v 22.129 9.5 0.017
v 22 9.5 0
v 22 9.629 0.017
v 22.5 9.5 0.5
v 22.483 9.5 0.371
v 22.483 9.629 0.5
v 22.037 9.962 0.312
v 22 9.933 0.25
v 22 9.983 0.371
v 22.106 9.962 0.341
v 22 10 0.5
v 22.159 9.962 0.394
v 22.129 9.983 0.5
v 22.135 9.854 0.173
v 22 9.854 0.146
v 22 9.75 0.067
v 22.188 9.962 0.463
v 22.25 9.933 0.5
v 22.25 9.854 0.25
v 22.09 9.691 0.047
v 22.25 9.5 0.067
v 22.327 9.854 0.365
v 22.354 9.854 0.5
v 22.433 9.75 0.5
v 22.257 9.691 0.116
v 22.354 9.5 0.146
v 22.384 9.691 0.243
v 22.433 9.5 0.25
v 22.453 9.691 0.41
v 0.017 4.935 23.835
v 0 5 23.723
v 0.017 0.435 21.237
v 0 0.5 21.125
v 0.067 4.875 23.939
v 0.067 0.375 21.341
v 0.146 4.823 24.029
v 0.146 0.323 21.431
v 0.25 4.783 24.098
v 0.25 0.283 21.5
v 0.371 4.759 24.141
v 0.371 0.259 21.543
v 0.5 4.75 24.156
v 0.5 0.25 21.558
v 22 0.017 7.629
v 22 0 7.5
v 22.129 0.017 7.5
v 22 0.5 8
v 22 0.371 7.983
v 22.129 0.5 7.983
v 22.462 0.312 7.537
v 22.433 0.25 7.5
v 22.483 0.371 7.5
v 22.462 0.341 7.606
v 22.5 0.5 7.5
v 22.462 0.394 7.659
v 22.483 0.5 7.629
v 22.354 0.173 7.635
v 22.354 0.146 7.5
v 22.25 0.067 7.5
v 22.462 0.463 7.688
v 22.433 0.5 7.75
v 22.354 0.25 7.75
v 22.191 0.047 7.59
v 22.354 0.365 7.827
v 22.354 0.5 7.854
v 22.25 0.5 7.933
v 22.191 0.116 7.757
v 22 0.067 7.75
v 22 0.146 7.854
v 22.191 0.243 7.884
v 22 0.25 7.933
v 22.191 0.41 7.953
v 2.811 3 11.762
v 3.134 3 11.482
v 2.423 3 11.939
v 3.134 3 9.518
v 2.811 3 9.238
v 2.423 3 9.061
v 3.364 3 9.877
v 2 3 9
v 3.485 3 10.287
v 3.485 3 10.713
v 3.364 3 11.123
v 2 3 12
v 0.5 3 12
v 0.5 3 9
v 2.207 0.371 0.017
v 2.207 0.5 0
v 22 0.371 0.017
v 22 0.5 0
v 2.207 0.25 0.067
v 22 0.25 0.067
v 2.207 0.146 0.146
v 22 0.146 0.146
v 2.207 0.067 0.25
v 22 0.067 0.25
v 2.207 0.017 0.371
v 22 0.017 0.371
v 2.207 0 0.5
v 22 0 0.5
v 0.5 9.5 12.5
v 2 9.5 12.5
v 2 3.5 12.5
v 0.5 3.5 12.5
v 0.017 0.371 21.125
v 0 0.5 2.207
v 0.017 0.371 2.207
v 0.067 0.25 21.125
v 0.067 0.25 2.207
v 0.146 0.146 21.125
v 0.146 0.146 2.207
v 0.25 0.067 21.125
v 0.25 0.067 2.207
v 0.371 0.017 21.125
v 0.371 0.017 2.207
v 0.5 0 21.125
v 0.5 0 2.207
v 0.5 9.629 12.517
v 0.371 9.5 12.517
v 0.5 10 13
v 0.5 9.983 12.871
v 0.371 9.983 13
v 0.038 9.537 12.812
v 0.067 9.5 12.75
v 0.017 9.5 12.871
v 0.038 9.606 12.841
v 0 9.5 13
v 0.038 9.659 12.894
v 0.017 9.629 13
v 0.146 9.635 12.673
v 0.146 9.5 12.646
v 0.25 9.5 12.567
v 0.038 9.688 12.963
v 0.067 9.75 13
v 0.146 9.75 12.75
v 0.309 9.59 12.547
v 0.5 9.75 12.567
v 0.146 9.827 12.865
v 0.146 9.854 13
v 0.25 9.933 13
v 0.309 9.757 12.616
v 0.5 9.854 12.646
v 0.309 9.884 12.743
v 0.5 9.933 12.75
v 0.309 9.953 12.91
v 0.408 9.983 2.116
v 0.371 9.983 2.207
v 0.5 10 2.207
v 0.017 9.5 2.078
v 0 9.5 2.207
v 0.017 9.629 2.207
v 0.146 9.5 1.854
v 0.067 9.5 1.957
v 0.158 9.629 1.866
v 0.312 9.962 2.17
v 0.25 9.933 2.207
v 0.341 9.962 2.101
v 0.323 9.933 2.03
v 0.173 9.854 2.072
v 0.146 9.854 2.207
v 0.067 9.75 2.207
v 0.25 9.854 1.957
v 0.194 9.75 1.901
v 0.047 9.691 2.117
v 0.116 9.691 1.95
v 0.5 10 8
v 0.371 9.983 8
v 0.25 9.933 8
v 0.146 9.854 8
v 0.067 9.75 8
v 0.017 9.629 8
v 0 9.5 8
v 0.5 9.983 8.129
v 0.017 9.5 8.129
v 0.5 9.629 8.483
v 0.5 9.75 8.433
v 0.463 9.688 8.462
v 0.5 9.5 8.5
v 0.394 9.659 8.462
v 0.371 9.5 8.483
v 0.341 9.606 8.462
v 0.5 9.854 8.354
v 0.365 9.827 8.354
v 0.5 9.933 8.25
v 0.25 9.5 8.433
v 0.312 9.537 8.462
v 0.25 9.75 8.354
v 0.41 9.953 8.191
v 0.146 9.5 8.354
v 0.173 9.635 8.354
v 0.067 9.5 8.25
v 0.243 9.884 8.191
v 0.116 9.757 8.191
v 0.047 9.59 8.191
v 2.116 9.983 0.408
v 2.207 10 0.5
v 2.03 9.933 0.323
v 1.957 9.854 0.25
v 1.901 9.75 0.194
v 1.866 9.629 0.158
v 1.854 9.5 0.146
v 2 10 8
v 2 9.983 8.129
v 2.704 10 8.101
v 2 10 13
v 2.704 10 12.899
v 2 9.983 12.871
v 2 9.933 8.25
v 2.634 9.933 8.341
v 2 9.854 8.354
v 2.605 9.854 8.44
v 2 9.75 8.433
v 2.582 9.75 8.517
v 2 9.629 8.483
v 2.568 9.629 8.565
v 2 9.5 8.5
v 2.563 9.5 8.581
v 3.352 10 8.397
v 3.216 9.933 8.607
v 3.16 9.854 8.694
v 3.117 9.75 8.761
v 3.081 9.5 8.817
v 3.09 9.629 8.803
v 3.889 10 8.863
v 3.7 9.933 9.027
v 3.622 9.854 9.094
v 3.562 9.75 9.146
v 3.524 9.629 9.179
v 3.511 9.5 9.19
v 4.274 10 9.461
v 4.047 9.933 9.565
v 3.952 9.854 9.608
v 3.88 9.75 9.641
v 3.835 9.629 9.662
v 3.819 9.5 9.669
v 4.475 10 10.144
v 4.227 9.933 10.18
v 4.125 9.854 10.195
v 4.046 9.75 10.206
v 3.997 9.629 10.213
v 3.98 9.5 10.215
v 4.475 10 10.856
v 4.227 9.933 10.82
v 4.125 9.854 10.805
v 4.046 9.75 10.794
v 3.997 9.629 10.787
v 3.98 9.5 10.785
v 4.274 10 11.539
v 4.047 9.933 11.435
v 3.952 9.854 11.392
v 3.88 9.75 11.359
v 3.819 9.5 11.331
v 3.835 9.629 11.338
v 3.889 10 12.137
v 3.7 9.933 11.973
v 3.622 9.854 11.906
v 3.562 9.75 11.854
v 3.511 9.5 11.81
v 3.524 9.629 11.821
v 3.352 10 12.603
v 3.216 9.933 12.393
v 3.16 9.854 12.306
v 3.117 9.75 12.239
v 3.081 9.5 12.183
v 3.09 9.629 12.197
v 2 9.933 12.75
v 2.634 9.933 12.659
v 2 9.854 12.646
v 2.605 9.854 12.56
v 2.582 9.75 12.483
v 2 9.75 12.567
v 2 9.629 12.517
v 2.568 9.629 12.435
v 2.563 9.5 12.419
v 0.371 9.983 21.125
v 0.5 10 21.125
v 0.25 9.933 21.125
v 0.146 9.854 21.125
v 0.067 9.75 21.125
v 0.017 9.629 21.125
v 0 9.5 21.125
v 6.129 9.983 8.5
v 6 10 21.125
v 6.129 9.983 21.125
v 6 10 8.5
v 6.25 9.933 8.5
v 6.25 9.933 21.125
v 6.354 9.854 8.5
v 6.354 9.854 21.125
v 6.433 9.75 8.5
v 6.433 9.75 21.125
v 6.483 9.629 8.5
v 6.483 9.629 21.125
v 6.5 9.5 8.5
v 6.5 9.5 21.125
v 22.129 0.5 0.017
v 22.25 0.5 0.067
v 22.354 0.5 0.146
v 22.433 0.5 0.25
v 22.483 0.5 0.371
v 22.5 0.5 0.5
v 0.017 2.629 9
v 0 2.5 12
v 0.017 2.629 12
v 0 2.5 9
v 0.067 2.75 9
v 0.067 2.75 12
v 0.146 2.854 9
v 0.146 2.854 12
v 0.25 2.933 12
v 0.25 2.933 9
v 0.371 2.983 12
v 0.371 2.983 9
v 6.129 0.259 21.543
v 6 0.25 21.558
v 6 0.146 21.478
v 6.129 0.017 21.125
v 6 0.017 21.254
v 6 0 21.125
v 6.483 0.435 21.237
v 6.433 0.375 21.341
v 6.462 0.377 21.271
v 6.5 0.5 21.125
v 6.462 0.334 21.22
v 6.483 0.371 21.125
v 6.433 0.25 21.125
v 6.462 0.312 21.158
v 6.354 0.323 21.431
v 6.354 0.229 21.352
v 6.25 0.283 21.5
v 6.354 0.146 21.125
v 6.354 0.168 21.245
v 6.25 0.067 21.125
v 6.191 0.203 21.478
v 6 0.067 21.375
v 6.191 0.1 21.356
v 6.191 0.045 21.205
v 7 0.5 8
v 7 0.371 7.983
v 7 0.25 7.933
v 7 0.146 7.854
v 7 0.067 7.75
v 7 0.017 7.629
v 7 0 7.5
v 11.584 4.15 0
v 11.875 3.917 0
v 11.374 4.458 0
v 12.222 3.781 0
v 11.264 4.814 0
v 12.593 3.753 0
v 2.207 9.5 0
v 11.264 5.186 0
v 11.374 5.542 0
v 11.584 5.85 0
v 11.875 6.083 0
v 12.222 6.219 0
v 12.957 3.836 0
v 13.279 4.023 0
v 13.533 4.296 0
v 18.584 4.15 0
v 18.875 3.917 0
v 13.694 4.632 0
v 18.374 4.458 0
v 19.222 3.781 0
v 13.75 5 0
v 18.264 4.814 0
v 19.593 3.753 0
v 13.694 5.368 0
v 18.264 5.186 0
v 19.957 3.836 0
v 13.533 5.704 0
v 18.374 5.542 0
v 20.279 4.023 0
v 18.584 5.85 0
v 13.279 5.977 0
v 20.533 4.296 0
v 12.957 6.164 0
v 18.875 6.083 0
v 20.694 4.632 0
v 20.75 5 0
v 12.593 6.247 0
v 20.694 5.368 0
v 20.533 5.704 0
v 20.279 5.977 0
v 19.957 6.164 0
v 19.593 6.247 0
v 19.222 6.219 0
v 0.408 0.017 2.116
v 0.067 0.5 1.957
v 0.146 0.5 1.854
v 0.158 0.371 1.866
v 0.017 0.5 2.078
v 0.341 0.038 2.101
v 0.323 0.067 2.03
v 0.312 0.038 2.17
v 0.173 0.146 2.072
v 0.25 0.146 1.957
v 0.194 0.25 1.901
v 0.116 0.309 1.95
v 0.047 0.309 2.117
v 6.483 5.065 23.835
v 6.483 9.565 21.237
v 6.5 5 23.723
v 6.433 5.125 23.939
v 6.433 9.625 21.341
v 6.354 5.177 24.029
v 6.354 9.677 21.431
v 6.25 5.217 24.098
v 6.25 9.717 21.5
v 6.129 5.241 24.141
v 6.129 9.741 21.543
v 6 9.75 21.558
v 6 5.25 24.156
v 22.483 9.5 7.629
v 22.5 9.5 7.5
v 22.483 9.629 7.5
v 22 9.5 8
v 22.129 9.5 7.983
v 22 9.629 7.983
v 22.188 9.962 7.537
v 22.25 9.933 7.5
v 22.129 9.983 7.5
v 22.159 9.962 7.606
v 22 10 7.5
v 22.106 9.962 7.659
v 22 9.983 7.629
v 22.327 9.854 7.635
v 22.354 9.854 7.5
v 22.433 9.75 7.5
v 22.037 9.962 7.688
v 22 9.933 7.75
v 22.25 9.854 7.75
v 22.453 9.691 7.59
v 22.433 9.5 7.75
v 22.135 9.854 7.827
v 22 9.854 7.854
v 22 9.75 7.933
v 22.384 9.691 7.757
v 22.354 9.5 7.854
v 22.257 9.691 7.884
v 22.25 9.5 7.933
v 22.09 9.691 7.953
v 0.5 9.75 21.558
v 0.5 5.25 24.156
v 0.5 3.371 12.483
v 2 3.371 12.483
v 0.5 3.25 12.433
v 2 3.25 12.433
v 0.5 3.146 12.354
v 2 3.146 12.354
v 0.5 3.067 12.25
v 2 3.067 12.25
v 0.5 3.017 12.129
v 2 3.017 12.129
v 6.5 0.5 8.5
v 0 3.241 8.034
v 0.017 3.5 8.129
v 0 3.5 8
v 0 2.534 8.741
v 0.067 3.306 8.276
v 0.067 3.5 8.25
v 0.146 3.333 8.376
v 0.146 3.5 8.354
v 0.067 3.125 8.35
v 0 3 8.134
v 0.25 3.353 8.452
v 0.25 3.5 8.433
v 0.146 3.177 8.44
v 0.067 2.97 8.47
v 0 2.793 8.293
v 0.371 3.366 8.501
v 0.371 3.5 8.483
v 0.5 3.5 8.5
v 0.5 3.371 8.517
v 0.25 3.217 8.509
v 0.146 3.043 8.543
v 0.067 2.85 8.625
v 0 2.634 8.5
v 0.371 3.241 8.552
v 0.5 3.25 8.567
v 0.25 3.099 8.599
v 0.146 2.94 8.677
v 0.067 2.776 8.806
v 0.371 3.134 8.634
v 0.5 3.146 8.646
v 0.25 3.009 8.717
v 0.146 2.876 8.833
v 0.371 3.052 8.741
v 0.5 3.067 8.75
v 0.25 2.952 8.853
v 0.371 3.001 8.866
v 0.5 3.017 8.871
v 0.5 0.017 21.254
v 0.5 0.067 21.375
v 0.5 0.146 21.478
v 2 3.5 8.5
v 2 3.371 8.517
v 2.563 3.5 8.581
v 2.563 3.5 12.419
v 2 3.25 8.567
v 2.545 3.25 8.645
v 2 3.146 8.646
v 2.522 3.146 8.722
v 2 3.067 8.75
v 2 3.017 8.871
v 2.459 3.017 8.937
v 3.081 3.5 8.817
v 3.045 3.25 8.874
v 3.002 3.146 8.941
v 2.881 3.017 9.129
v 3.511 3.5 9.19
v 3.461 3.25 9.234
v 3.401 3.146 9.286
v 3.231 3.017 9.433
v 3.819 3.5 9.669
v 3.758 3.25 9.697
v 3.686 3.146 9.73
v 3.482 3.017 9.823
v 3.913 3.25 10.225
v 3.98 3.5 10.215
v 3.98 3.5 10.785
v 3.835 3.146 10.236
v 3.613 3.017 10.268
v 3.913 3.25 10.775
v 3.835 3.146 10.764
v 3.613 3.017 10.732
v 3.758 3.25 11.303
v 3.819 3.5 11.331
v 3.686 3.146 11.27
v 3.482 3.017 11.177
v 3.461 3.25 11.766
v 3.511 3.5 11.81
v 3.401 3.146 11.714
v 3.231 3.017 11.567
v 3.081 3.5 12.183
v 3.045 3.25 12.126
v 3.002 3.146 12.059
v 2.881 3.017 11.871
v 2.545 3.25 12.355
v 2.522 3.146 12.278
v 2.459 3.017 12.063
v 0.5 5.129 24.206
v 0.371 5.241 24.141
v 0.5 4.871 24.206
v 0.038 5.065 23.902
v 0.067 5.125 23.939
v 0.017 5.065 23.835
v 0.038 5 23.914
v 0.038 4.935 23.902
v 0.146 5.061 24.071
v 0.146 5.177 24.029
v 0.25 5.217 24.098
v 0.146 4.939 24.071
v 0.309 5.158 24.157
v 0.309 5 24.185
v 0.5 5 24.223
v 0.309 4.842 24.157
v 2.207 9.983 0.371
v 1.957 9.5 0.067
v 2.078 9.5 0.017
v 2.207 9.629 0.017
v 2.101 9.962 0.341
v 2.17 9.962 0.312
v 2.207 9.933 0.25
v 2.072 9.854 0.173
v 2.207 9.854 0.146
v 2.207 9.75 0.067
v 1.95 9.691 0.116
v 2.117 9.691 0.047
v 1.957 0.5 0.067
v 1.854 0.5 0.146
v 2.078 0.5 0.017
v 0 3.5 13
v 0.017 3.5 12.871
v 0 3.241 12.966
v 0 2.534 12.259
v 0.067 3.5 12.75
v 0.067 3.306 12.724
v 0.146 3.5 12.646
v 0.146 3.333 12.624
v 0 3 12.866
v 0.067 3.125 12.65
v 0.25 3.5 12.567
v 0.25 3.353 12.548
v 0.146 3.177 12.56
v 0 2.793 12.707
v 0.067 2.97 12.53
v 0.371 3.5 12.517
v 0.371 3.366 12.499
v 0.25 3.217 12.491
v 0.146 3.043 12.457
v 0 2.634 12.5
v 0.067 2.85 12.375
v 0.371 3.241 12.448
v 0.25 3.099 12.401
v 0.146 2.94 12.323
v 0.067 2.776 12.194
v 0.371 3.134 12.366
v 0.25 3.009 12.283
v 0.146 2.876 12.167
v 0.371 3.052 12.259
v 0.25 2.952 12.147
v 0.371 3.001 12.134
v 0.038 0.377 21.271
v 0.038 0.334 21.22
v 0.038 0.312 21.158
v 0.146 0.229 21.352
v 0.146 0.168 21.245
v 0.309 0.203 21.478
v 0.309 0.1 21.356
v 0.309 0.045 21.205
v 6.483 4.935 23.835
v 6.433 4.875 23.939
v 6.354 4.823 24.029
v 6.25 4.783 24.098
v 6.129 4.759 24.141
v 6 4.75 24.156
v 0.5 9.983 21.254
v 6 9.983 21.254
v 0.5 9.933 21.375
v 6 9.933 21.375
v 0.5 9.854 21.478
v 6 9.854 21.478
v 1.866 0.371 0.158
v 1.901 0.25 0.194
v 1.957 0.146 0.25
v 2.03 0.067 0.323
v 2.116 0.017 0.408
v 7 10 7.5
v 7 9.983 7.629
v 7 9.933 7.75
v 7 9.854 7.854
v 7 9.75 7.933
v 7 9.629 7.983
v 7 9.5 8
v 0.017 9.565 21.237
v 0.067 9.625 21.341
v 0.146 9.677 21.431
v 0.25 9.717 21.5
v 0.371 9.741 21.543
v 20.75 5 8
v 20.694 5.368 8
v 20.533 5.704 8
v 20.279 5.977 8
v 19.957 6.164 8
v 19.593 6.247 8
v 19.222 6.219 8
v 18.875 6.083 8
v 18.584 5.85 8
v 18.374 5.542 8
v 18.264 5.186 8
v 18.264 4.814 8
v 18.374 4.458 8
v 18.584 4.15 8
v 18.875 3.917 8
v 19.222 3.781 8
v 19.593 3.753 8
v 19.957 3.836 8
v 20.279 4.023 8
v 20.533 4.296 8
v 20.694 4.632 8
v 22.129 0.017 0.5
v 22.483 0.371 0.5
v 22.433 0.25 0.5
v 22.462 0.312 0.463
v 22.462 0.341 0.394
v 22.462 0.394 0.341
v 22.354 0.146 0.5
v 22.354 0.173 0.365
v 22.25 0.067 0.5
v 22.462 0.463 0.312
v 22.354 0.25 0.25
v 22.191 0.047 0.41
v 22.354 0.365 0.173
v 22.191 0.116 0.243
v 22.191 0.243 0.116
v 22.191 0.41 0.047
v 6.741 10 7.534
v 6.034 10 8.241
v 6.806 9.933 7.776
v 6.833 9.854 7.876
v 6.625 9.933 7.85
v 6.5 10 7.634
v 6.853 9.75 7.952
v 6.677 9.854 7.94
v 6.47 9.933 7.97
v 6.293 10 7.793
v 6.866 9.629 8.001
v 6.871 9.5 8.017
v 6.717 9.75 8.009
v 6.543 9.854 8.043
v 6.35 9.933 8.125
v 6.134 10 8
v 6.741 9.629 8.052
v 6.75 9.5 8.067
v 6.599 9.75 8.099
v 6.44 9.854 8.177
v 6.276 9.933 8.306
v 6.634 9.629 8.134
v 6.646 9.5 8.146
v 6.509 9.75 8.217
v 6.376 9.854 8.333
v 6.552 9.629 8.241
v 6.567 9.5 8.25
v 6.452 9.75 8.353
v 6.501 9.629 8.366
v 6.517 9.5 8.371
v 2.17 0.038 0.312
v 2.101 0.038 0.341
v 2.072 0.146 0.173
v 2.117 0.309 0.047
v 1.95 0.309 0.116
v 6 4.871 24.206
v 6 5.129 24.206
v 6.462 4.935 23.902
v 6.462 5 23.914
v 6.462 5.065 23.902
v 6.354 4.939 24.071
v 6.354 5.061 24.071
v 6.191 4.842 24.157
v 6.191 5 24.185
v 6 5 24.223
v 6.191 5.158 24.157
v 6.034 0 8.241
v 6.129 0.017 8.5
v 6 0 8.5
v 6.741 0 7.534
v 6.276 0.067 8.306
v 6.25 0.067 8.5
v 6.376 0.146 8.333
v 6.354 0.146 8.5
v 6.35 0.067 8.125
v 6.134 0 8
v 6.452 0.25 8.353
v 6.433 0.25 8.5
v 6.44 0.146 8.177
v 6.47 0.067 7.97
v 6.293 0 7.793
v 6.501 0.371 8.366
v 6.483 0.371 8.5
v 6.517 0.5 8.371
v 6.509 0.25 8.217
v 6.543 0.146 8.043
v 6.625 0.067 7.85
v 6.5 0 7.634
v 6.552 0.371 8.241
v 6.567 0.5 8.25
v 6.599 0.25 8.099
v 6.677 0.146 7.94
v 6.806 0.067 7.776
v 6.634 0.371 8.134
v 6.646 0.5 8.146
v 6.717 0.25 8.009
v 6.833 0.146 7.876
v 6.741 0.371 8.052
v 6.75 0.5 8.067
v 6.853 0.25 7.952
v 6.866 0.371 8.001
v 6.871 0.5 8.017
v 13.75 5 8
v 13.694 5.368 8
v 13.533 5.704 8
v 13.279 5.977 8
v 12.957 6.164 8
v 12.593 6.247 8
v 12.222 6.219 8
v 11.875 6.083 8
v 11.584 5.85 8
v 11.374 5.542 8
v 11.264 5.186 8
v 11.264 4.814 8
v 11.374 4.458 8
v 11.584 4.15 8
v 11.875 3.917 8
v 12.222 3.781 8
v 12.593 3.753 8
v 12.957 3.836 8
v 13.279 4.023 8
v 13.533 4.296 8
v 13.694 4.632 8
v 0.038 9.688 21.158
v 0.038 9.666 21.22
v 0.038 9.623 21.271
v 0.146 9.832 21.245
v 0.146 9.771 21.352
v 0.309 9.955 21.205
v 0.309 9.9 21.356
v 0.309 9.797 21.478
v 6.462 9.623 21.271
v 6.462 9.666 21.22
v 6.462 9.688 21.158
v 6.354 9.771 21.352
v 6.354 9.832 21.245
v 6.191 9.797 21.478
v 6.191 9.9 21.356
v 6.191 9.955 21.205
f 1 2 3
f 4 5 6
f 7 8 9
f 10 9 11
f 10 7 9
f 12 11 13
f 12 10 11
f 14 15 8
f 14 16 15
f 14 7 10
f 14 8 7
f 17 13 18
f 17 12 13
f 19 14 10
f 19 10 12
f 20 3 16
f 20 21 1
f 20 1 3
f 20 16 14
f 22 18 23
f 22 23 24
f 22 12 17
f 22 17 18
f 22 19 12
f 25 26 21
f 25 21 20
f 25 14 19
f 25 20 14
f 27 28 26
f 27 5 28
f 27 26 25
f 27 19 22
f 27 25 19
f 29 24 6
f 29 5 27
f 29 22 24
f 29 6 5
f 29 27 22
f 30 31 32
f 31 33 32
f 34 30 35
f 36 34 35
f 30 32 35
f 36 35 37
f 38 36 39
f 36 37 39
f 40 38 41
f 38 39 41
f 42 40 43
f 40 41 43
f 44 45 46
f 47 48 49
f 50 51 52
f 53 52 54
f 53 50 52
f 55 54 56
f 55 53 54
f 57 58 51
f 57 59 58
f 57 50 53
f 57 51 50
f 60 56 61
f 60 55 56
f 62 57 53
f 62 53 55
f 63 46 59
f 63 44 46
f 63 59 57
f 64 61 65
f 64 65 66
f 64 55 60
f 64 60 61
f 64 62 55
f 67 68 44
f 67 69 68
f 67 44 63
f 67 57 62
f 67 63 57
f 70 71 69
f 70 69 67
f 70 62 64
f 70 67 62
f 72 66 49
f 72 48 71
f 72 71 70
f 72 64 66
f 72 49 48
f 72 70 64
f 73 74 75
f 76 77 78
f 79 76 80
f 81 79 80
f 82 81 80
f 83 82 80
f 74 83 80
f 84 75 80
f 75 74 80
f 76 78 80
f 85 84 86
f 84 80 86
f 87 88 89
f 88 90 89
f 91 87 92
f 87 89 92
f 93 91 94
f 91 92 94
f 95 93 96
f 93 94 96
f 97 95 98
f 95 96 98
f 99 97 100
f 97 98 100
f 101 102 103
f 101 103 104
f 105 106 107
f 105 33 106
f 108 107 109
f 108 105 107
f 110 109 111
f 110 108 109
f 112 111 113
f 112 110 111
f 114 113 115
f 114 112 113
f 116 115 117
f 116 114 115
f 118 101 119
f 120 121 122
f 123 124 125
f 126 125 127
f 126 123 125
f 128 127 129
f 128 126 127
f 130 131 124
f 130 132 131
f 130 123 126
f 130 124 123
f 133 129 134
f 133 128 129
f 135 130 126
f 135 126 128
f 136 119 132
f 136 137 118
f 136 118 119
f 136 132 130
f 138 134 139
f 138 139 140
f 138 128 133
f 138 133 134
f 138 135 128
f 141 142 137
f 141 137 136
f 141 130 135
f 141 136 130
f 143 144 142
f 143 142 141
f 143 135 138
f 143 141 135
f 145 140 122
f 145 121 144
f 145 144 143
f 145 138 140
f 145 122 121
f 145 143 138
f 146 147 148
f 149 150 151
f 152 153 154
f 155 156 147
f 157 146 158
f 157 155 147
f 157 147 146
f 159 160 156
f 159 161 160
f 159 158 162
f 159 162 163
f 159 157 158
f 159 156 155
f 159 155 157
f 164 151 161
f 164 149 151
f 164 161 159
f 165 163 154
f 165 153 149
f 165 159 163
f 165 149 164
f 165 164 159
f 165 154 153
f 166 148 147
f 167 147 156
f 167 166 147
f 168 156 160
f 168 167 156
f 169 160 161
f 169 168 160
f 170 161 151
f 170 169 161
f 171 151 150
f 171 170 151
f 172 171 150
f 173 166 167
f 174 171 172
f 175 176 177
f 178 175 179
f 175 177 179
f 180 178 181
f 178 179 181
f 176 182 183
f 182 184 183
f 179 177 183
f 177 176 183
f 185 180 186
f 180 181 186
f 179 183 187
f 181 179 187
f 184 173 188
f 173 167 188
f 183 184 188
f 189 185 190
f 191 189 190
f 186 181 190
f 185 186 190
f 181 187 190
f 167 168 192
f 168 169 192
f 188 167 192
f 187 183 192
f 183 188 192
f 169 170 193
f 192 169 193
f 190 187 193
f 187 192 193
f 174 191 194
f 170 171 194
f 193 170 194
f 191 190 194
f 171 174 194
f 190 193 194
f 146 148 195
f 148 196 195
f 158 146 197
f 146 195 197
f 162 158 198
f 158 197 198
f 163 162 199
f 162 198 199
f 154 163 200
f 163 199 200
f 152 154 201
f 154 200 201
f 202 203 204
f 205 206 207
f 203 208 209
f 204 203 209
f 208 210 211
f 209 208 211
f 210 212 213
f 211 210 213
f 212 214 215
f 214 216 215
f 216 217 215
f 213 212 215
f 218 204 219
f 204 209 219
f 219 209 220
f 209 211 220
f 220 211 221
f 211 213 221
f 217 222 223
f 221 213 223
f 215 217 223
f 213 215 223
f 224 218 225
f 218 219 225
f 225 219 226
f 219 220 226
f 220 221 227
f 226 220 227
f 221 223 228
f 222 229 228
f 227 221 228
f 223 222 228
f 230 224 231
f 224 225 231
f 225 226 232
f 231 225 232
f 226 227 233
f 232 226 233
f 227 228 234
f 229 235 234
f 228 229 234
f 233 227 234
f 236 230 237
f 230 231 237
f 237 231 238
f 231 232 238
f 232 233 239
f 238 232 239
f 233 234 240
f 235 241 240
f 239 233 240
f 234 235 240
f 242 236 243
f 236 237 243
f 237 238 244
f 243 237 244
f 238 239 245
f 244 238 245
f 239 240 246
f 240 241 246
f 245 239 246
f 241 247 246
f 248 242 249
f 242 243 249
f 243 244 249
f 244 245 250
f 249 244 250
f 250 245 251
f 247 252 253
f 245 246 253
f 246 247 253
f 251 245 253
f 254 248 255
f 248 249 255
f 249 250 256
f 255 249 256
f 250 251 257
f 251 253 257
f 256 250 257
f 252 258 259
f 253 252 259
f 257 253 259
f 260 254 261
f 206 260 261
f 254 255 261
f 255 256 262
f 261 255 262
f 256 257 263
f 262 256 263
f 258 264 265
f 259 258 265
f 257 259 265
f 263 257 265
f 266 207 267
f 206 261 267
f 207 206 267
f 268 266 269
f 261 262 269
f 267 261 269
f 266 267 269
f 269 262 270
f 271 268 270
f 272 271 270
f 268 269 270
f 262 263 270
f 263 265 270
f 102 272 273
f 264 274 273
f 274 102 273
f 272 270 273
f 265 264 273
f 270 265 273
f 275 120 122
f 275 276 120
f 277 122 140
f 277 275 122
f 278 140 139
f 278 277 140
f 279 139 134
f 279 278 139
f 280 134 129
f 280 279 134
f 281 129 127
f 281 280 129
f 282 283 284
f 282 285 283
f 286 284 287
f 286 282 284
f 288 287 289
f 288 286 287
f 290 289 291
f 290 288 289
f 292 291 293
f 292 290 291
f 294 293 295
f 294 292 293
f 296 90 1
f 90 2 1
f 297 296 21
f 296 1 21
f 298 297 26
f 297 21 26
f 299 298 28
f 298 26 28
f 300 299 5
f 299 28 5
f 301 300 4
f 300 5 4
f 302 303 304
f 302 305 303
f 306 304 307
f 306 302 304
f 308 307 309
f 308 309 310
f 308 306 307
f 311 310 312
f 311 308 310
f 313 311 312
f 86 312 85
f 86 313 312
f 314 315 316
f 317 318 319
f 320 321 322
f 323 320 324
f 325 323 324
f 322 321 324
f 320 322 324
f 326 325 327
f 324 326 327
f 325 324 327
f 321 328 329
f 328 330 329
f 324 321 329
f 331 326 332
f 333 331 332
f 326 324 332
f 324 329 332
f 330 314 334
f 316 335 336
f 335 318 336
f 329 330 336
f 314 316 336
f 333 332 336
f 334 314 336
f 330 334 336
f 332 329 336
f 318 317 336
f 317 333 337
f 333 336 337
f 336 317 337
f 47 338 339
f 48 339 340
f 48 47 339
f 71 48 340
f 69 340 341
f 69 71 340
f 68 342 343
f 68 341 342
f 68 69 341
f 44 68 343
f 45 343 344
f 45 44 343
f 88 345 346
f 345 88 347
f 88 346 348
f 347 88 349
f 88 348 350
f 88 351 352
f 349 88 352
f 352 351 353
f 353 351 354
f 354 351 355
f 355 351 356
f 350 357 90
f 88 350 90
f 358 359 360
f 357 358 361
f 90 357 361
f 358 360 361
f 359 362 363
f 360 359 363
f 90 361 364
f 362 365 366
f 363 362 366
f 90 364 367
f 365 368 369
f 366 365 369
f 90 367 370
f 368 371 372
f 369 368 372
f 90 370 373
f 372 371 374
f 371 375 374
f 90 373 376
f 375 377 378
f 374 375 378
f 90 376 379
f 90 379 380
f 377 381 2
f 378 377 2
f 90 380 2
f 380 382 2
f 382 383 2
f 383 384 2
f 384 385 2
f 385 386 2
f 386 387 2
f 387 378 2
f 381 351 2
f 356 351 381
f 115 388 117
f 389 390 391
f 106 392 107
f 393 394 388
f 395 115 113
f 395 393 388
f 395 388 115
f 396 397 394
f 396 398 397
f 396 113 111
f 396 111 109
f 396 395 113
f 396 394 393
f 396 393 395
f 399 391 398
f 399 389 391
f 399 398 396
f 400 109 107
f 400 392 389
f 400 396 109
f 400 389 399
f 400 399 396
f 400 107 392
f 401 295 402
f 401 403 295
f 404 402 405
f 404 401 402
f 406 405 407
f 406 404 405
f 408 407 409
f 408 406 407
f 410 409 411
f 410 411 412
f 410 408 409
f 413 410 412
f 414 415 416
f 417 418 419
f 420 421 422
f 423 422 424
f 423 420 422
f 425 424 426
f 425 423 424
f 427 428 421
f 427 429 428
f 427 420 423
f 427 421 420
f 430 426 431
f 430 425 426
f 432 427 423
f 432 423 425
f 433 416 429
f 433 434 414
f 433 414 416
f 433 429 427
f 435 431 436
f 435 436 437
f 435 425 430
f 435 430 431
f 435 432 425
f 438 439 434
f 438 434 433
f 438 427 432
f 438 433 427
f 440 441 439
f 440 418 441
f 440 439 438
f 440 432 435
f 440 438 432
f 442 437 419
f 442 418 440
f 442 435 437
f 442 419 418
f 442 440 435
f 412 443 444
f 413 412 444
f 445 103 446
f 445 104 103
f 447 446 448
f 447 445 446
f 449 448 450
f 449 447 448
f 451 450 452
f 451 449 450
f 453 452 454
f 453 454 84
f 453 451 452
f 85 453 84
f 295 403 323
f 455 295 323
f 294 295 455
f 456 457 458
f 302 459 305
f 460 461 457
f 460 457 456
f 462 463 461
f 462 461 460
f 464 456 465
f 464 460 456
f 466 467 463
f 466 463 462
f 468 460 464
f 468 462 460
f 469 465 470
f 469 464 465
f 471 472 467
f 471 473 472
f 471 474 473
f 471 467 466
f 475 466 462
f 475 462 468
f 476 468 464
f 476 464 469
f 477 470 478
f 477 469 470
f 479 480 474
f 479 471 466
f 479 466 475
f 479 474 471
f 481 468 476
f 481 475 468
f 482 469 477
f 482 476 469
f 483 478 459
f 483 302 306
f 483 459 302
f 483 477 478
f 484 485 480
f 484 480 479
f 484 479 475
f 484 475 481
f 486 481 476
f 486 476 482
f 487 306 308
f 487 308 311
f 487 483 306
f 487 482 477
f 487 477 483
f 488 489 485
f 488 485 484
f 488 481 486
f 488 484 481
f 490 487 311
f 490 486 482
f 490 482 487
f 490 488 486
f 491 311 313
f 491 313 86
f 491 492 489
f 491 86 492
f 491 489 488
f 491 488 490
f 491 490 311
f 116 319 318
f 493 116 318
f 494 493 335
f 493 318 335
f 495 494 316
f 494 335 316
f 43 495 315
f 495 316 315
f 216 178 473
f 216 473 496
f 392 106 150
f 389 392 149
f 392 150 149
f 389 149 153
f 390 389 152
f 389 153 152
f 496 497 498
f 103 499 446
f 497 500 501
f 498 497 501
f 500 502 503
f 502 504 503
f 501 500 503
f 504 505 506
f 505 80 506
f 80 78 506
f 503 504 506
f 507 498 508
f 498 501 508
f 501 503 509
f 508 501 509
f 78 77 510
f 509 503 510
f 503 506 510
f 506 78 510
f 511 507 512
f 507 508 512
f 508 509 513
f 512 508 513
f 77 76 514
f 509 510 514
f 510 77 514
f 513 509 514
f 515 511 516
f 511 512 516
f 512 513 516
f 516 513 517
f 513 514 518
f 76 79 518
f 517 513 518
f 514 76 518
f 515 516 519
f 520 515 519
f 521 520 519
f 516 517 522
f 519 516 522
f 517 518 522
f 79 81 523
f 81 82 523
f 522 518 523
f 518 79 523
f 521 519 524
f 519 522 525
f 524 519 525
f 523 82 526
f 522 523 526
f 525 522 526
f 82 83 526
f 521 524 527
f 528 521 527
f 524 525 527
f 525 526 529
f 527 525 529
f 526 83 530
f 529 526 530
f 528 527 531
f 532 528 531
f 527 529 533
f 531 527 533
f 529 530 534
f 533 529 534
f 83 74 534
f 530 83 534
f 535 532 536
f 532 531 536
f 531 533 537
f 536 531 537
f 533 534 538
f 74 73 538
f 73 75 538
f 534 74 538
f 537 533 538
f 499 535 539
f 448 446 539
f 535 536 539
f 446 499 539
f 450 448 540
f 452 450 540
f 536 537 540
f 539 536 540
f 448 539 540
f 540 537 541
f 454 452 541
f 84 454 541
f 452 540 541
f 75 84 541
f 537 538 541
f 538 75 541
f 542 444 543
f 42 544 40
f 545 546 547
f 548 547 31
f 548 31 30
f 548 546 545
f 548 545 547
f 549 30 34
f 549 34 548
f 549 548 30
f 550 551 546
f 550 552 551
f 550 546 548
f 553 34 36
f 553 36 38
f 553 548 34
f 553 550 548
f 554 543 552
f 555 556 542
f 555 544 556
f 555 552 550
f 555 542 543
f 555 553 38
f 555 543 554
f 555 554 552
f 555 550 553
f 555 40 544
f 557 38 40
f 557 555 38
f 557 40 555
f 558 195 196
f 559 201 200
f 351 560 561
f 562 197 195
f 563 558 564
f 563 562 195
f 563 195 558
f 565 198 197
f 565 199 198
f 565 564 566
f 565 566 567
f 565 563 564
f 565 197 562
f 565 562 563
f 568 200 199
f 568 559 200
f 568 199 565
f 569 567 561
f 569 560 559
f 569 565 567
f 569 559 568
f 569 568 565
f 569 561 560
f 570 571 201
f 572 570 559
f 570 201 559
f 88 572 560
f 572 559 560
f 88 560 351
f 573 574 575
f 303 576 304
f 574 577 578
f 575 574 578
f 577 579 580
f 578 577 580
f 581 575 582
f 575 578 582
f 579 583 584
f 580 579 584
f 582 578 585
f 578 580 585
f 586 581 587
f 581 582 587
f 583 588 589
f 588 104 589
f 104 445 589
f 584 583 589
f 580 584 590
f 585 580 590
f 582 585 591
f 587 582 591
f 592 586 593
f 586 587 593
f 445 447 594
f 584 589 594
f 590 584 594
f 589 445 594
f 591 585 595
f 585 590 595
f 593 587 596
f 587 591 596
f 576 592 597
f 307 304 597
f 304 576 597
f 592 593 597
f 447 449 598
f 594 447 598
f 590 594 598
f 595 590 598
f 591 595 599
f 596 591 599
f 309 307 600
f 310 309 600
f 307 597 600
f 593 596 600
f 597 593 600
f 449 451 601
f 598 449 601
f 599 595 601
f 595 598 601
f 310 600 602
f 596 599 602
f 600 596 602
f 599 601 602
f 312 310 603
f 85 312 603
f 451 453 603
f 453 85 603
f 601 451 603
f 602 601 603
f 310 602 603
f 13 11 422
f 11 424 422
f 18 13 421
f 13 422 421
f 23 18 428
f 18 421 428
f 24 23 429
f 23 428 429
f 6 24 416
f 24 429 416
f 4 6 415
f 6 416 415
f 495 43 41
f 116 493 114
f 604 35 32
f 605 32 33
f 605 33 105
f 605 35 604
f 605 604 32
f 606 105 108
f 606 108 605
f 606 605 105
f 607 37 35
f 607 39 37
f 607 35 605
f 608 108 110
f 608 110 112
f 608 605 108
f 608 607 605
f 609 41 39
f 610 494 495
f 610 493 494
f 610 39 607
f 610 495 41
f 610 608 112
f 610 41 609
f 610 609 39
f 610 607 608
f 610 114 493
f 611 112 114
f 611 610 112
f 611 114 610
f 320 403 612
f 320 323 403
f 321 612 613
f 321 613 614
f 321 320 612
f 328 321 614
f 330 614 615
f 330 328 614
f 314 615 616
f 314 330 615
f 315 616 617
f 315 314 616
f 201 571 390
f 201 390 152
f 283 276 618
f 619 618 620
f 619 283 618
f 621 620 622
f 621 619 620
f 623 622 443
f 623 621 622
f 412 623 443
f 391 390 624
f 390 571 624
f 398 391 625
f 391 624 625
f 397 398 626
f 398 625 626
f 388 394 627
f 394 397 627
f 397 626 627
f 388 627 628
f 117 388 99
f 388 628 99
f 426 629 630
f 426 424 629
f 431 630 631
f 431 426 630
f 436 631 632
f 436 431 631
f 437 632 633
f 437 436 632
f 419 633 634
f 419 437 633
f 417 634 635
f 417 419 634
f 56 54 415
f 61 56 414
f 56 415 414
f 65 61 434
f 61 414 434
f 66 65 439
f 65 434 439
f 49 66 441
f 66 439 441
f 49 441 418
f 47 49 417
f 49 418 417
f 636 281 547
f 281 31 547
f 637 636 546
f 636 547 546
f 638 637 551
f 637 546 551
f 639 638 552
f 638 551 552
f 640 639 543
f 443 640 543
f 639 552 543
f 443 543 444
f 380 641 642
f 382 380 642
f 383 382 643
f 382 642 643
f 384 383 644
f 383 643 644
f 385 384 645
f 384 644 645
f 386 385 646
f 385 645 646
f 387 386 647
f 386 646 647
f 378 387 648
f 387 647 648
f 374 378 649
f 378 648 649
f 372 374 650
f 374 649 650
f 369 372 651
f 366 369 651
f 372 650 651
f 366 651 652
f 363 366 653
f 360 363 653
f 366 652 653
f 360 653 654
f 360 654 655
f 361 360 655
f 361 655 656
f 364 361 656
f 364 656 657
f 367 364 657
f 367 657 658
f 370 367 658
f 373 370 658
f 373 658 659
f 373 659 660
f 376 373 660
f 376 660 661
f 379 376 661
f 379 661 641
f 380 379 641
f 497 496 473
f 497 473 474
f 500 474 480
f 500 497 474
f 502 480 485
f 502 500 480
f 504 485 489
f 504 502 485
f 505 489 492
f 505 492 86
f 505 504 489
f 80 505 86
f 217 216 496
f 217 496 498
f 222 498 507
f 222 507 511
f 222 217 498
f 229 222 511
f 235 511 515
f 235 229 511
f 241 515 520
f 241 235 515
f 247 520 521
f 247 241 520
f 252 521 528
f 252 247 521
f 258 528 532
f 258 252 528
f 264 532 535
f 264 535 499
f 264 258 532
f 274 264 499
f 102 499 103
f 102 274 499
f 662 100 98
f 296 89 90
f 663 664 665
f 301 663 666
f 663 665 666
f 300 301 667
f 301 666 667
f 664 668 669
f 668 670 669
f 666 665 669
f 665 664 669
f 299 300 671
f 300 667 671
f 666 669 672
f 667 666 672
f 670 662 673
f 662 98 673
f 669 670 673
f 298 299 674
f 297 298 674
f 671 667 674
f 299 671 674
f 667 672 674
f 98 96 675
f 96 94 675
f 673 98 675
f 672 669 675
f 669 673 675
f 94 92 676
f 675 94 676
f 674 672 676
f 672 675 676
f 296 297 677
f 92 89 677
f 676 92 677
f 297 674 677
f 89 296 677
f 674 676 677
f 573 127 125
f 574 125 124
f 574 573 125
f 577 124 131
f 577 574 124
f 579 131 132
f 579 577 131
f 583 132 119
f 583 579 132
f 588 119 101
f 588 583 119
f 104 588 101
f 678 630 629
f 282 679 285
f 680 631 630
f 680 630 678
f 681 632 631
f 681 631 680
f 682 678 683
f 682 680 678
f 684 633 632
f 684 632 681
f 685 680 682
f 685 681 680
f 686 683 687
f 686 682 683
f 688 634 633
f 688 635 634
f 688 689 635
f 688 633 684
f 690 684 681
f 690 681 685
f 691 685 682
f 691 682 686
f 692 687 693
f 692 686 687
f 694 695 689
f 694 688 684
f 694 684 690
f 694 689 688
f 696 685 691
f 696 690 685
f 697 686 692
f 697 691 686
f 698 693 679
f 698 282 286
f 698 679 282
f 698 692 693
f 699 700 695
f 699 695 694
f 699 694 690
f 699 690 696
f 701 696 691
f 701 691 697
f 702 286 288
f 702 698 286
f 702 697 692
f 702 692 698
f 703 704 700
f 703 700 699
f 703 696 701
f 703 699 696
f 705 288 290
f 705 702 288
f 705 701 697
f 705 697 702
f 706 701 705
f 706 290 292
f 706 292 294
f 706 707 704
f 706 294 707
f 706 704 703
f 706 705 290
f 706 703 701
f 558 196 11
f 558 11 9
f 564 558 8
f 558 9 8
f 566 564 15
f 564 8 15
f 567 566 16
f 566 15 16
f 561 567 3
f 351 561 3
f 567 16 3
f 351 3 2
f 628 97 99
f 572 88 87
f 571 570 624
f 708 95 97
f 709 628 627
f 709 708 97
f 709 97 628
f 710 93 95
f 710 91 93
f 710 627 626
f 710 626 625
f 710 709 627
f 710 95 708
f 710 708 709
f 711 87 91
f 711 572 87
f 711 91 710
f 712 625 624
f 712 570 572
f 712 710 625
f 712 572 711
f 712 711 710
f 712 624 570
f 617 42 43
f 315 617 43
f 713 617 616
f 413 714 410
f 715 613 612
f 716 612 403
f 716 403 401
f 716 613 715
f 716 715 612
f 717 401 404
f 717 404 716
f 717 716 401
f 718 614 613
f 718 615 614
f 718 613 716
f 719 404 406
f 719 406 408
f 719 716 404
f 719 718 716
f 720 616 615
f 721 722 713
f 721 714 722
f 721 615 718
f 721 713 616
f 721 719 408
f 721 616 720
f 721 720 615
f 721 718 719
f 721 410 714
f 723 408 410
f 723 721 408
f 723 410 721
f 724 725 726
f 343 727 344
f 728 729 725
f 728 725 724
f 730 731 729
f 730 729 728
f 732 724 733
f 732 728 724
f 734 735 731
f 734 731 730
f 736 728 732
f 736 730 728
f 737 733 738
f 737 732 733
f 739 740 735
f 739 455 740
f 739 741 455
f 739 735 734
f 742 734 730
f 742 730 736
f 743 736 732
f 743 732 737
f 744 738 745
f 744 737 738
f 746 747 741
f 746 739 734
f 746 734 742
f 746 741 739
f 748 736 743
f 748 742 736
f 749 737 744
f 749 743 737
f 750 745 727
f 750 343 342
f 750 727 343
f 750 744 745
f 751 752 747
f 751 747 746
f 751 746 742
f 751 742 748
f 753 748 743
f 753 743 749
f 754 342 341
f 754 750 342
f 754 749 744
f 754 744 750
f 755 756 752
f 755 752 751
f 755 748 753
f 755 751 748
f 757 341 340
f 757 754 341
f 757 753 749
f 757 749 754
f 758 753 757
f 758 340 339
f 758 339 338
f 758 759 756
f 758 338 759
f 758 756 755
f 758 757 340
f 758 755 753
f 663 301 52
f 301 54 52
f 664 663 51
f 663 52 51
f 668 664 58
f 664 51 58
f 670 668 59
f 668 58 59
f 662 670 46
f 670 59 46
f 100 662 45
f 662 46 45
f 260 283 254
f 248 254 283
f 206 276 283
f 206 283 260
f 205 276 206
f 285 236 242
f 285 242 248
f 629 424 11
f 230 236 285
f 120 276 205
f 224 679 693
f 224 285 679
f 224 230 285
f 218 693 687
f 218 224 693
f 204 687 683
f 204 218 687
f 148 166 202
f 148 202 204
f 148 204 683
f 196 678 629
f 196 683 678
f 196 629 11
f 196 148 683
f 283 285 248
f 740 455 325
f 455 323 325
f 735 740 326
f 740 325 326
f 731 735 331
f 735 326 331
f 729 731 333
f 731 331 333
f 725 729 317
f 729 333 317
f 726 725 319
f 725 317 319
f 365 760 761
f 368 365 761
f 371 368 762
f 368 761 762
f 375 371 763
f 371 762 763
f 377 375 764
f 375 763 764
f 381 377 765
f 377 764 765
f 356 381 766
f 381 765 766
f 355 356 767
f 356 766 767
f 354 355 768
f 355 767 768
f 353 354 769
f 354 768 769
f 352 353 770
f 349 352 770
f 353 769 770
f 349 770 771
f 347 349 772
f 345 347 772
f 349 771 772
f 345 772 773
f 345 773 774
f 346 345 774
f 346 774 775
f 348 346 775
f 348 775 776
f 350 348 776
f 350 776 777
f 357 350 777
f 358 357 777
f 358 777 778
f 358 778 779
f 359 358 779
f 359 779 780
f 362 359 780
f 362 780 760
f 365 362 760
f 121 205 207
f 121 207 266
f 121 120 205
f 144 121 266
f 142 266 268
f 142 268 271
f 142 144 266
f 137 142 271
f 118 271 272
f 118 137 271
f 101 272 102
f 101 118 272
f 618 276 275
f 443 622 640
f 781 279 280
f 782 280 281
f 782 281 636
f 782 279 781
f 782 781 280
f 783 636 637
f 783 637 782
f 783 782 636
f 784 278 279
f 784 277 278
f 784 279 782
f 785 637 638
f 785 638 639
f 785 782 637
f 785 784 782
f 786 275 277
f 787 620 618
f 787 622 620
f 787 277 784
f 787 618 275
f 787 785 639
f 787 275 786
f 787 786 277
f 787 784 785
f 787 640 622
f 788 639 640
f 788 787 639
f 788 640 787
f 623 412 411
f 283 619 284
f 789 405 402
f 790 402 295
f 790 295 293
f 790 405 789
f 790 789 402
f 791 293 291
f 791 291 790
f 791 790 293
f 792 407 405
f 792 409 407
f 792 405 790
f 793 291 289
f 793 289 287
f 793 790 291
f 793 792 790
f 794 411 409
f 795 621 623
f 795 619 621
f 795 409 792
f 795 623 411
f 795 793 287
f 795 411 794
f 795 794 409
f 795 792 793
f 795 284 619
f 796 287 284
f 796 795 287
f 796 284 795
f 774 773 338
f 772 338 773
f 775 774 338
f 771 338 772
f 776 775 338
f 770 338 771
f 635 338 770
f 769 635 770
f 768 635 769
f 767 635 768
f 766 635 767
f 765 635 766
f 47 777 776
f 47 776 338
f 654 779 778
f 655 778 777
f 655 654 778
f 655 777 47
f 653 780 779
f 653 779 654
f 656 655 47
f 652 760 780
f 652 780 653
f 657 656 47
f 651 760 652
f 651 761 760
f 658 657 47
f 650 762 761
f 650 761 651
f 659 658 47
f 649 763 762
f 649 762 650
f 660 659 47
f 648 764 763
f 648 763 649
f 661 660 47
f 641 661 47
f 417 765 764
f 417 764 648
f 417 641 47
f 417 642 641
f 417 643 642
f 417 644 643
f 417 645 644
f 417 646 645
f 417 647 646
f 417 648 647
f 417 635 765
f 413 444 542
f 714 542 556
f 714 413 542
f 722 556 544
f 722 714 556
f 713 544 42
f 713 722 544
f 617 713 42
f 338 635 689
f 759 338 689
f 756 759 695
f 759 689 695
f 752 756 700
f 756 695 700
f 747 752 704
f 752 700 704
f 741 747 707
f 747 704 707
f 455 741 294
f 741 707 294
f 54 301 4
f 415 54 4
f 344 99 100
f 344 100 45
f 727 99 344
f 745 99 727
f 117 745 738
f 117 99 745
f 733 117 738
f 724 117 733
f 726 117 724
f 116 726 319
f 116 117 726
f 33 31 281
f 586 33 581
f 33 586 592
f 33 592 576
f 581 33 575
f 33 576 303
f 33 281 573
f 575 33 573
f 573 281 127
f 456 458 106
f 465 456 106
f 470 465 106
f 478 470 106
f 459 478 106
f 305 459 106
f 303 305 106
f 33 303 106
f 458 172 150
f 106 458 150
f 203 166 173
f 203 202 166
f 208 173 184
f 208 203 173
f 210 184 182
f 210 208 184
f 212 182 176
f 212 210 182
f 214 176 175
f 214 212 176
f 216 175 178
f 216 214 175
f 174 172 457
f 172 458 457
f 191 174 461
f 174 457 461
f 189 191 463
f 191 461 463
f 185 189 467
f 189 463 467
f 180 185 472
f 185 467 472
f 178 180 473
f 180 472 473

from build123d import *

# Parameters (mm, degrees)
ESQUISSE1_W             = 22.5
ESQUISSE1_H             = 10
BOSS_EXTRU_1_DEPTH      = 8
CHANFREIN1_SIZE         = 2
BOSS_EXTRU_3_DEPTH      = 6.5
ENL_V_MAT_EXTRU_1_DEPTH = 7
TROU_TARAUD_M33_D       = 2.5
CONG_1_R                = 0.5


with BuildPart() as part:
    # Esquisse1 → Boss.-Extru.1 (new body)
    with BuildSketch(Plane.XY):
        with Locations((11.25, 5)):
            Rectangle(ESQUISSE1_W, ESQUISSE1_H)
    extrude(amount=BOSS_EXTRU_1_DEPTH)

    # Chanfrein1
    chanfrein1_edges = [part.edges().sort_by_distance(p)[0] for p in [
        (0, 5, 0),
    ]]
    chamfer(chanfrein1_edges, length=CHANFREIN1_SIZE)

    # Esquisse3 → Boss.-Extru.3 (add)
    with BuildSketch(Plane.ZY):
        Polygon((8, 10), (21.413248654, 10), (24.3, 5), (21.413248654, 0), (8, 0), (2, 0), (2, 10), align=None)
    extrude(amount=-BOSS_EXTRU_3_DEPTH)

    # Esquisse4 → Enlèv. mat.-Extru.1 (cut)
    with BuildSketch(Plane(origin=(0, 10, 0), x_dir=(1, 0, 0), z_dir=(0, 1, 0))):
        with BuildLine():
            Line((0, -8.5), (2, -8.5))
            ThreePointArc((2, -8.5), (4, -10.5), (2, -12.5))
            Line((2, -12.5), (0, -12.5))
            Line((0, -12.5), (0, -8.5))
        make_face()
    extrude(amount=-ENL_V_MAT_EXTRU_1_DEPTH, mode=Mode.SUBTRACT)

    # Trou taraudé M33 (through all)
    with Locations(Plane(origin=(19.5, 5, 0), x_dir=(-1, 0, 0), z_dir=(0, 0, -1))):
        with Locations((0, 0), (7, 0)):
            Hole(TROU_TARAUD_M33_D / 2)

    # Congé1
    cong_1_edges = [part.edges().sort_by_distance(p)[0] for p in [
        (0, 10, 5.25),
        (3.25, 5, 24.3),
        (3.25, 0, 21.413248654),
        (14.5, 0, 8),
        (12.25, 0, 0),
        (1, 0, 1),
        (2, 5, 0),
        (1, 3, 8.5),
        (4, 3, 10.5),
        (1, 3, 12.5),
        (22.5, 0, 4),
        (22.5, 5, 8),
        (22.5, 5, 0),
        (6.5, 2.5, 22.856624327),
        (6.5, 7.5, 22.856624327),
        (6.5, 5, 8),
        (6.5, 0, 14.706624327),
        (1, 10, 1),
        (12.25, 10, 0),
        (22.5, 10, 4),
        (14.5, 10, 8),
        (6.5, 10, 14.706624327),
        (3.25, 10, 21.413248654),
        (1, 10, 12.5),
        (4, 10, 10.5),
        (1, 10, 8.5),
        (0, 6.5, 12.5),
        (0, 10, 16.956624327),
        (0, 7.5, 22.856624327),
        (0, 2.5, 22.856624327),
        (0, 0, 11.706624327),
        (0, 5, 2),
        (0, 6.5, 8.5),
        (0, 3, 10.5),
    ]]
    fillet(cong_1_edges, radius=CONG_1_R)


solid = part.part
